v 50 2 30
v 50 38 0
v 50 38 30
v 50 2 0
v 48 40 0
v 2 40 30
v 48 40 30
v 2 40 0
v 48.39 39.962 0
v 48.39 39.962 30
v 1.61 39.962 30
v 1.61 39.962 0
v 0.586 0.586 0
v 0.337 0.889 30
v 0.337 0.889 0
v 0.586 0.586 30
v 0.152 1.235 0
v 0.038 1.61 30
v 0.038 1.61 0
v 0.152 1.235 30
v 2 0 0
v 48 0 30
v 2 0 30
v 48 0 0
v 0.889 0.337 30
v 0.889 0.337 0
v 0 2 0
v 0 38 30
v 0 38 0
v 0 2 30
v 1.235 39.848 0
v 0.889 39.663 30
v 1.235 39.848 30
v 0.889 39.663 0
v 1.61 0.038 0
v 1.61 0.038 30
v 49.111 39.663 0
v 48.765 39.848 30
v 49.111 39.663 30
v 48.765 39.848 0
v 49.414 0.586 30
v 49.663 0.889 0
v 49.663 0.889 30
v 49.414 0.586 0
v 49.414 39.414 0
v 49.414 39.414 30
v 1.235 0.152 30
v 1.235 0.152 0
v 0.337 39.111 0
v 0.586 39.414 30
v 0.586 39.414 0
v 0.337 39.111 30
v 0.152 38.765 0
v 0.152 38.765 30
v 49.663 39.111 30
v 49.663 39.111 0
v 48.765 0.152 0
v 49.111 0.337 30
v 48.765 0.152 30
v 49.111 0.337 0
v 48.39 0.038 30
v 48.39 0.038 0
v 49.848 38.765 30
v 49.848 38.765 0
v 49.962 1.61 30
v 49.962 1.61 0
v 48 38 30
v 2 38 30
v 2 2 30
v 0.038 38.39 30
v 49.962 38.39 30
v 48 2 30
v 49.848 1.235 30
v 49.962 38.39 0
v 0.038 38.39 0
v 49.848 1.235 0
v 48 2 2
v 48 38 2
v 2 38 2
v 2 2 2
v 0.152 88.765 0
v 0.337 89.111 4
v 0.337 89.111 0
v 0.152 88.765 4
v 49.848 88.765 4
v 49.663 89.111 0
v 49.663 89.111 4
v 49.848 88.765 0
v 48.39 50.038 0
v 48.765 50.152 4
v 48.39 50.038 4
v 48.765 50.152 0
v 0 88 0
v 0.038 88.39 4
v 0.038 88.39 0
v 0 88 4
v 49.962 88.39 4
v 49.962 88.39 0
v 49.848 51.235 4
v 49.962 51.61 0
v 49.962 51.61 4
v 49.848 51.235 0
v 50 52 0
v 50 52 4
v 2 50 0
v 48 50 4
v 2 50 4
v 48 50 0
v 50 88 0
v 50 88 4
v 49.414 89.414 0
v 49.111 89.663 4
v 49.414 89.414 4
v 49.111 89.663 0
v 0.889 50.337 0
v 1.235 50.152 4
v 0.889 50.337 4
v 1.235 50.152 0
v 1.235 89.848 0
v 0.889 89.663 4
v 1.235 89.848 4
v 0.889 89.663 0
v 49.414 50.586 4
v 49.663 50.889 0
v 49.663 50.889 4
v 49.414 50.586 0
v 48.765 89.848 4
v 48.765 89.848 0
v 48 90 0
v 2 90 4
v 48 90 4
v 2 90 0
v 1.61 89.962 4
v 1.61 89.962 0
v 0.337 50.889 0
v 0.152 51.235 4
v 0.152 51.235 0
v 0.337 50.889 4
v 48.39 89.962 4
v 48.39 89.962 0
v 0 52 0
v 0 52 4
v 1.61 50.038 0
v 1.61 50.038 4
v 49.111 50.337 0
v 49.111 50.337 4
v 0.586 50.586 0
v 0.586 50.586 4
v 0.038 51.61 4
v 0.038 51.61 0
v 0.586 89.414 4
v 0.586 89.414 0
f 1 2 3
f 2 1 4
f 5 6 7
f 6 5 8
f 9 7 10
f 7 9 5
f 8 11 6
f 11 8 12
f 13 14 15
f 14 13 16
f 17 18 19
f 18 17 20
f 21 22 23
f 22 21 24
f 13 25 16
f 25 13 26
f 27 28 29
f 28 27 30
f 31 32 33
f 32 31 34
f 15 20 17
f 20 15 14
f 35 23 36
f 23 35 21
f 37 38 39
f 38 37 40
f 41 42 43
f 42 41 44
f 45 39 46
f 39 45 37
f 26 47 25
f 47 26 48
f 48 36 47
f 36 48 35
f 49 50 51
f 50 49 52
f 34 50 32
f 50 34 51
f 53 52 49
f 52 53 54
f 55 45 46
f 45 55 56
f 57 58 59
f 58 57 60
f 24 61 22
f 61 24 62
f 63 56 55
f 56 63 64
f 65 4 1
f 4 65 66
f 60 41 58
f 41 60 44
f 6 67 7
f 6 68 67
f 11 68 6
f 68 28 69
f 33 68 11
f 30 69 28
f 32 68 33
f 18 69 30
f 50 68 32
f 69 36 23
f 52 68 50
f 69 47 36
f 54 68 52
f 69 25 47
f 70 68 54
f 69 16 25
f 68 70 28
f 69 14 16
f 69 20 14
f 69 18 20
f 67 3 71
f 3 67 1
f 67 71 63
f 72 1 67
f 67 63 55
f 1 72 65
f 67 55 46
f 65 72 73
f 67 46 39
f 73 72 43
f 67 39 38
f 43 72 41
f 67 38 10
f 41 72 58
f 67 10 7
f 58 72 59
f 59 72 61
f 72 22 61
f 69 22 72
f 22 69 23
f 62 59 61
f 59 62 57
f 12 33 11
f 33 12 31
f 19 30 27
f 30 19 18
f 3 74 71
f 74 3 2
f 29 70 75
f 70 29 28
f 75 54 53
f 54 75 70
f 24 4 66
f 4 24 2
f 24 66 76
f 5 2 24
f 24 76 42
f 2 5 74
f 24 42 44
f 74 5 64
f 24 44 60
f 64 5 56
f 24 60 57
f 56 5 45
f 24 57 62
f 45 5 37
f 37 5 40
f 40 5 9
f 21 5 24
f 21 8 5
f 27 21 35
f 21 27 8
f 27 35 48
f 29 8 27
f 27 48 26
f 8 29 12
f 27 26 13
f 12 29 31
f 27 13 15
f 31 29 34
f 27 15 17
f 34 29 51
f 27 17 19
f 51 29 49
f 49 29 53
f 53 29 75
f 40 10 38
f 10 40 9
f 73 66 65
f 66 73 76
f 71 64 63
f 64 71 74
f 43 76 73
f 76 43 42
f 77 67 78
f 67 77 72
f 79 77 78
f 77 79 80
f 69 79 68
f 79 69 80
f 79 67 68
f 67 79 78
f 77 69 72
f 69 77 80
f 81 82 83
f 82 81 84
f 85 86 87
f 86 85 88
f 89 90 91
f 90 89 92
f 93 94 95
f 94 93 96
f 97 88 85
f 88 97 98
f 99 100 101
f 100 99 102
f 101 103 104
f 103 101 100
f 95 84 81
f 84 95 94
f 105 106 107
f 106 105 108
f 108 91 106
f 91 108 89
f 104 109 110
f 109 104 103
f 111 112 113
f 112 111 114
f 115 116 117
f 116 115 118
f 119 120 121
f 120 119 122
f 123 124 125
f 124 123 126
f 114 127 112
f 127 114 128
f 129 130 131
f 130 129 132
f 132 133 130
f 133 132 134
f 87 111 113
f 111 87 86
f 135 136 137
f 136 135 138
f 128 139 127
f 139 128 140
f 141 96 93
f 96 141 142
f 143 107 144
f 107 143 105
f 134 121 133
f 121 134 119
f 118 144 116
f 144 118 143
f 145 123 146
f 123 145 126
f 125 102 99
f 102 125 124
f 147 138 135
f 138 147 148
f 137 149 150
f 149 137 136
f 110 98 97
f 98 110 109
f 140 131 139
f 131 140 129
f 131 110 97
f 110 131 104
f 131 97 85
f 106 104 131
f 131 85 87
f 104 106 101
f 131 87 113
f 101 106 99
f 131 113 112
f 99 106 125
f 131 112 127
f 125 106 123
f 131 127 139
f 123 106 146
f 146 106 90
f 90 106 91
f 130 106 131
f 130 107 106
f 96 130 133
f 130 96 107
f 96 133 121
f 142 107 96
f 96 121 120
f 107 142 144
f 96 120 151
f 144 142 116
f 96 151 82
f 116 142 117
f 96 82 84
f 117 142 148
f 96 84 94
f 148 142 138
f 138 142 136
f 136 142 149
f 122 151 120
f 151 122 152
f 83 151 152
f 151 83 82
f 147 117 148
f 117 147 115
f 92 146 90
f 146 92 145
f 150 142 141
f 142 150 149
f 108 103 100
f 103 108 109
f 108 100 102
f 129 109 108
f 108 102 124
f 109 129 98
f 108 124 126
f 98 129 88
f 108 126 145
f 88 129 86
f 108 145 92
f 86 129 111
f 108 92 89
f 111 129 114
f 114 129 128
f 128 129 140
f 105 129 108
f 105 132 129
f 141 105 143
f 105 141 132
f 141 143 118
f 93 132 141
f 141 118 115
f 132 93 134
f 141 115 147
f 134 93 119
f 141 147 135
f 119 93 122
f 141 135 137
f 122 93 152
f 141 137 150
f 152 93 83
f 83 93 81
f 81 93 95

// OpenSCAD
// Simple Parametric Box
// A basic customizable box for testing and learning
// License: CC0 (Public Domain)

/* [Dimensions] */
// Width of the box (X axis)
width = 50; // [10:100]

// Depth of the box (Y axis)
depth = 40; // [10:100]

// Height of the box (Z axis)
height = 30; // [10:100]

// Wall thickness
wall_thickness = 2; // [1:0.5:5]

/* [Features] */
// Add a lid
include_lid = "yes"; // [yes, no]

// Add ventilation holes
ventilation = "no"; // [yes, no]

// Number of holes per side
hole_count = 3; // [1:10]

// Hole diameter
hole_diameter = 5; // [3:1:10]

/* [Advanced] */
// Corner radius (0 for sharp corners)
corner_radius = 2; // [0:0.5:10]

// Render quality (higher = smoother, slower)
$fn = 32; // [16:4:128]

/* [Hidden] */
// Internal variables
inner_width = width - (wall_thickness * 2);
inner_depth = depth - (wall_thickness * 2);
inner_height = height - wall_thickness;
lid_height = wall_thickness;

// Main module
module box() {
    difference() {
        // Outer box
        if (corner_radius > 0) {
            rounded_box(width, depth, height, corner_radius);
        } else {
            cube([width, depth, height]);
        }
        
        // Hollow interior
        translate([wall_thickness, wall_thickness, wall_thickness])
            cube([inner_width, inner_depth, inner_height + 0.1]);
        
        // Ventilation holes
        if (ventilation == "yes") {
            add_ventilation_holes();
        }
    }
}

module lid() {
    if (corner_radius > 0) {
        rounded_box(width, depth, lid_height + 2, corner_radius);
    } else {
        cube([width, depth, lid_height + 2]);
    }
}

module rounded_box(w, d, h, r) {
    hull() {
        translate([r, r, 0])
            cylinder(r=r, h=h);
        translate([w-r, r, 0])
            cylinder(r=r, h=h);
        translate([r, d-r, 0])
            cylinder(r=r, h=h);
        translate([w-r, d-r, 0])
            cylinder(r=r, h=h);
    }
}

module add_ventilation_holes() {
    spacing = width / (hole_count + 1);
    
    for (i = [1:hole_count]) {
        // Front side
        translate([spacing * i, -0.1, height/2])
            rotate([-90, 0, 0])
            cylinder(d=hole_diameter, h=wall_thickness + 0.2);
        
        // Back side
        translate([spacing * i, depth - wall_thickness - 0.1, height/2])
            rotate([-90, 0, 0])
            cylinder(d=hole_diameter, h=wall_thickness + 0.2);
    }
}

// Render
if (include_lid == "yes") {
    box();
    translate([0, depth + 10, 0])
        lid();
} else {
    box();
}
